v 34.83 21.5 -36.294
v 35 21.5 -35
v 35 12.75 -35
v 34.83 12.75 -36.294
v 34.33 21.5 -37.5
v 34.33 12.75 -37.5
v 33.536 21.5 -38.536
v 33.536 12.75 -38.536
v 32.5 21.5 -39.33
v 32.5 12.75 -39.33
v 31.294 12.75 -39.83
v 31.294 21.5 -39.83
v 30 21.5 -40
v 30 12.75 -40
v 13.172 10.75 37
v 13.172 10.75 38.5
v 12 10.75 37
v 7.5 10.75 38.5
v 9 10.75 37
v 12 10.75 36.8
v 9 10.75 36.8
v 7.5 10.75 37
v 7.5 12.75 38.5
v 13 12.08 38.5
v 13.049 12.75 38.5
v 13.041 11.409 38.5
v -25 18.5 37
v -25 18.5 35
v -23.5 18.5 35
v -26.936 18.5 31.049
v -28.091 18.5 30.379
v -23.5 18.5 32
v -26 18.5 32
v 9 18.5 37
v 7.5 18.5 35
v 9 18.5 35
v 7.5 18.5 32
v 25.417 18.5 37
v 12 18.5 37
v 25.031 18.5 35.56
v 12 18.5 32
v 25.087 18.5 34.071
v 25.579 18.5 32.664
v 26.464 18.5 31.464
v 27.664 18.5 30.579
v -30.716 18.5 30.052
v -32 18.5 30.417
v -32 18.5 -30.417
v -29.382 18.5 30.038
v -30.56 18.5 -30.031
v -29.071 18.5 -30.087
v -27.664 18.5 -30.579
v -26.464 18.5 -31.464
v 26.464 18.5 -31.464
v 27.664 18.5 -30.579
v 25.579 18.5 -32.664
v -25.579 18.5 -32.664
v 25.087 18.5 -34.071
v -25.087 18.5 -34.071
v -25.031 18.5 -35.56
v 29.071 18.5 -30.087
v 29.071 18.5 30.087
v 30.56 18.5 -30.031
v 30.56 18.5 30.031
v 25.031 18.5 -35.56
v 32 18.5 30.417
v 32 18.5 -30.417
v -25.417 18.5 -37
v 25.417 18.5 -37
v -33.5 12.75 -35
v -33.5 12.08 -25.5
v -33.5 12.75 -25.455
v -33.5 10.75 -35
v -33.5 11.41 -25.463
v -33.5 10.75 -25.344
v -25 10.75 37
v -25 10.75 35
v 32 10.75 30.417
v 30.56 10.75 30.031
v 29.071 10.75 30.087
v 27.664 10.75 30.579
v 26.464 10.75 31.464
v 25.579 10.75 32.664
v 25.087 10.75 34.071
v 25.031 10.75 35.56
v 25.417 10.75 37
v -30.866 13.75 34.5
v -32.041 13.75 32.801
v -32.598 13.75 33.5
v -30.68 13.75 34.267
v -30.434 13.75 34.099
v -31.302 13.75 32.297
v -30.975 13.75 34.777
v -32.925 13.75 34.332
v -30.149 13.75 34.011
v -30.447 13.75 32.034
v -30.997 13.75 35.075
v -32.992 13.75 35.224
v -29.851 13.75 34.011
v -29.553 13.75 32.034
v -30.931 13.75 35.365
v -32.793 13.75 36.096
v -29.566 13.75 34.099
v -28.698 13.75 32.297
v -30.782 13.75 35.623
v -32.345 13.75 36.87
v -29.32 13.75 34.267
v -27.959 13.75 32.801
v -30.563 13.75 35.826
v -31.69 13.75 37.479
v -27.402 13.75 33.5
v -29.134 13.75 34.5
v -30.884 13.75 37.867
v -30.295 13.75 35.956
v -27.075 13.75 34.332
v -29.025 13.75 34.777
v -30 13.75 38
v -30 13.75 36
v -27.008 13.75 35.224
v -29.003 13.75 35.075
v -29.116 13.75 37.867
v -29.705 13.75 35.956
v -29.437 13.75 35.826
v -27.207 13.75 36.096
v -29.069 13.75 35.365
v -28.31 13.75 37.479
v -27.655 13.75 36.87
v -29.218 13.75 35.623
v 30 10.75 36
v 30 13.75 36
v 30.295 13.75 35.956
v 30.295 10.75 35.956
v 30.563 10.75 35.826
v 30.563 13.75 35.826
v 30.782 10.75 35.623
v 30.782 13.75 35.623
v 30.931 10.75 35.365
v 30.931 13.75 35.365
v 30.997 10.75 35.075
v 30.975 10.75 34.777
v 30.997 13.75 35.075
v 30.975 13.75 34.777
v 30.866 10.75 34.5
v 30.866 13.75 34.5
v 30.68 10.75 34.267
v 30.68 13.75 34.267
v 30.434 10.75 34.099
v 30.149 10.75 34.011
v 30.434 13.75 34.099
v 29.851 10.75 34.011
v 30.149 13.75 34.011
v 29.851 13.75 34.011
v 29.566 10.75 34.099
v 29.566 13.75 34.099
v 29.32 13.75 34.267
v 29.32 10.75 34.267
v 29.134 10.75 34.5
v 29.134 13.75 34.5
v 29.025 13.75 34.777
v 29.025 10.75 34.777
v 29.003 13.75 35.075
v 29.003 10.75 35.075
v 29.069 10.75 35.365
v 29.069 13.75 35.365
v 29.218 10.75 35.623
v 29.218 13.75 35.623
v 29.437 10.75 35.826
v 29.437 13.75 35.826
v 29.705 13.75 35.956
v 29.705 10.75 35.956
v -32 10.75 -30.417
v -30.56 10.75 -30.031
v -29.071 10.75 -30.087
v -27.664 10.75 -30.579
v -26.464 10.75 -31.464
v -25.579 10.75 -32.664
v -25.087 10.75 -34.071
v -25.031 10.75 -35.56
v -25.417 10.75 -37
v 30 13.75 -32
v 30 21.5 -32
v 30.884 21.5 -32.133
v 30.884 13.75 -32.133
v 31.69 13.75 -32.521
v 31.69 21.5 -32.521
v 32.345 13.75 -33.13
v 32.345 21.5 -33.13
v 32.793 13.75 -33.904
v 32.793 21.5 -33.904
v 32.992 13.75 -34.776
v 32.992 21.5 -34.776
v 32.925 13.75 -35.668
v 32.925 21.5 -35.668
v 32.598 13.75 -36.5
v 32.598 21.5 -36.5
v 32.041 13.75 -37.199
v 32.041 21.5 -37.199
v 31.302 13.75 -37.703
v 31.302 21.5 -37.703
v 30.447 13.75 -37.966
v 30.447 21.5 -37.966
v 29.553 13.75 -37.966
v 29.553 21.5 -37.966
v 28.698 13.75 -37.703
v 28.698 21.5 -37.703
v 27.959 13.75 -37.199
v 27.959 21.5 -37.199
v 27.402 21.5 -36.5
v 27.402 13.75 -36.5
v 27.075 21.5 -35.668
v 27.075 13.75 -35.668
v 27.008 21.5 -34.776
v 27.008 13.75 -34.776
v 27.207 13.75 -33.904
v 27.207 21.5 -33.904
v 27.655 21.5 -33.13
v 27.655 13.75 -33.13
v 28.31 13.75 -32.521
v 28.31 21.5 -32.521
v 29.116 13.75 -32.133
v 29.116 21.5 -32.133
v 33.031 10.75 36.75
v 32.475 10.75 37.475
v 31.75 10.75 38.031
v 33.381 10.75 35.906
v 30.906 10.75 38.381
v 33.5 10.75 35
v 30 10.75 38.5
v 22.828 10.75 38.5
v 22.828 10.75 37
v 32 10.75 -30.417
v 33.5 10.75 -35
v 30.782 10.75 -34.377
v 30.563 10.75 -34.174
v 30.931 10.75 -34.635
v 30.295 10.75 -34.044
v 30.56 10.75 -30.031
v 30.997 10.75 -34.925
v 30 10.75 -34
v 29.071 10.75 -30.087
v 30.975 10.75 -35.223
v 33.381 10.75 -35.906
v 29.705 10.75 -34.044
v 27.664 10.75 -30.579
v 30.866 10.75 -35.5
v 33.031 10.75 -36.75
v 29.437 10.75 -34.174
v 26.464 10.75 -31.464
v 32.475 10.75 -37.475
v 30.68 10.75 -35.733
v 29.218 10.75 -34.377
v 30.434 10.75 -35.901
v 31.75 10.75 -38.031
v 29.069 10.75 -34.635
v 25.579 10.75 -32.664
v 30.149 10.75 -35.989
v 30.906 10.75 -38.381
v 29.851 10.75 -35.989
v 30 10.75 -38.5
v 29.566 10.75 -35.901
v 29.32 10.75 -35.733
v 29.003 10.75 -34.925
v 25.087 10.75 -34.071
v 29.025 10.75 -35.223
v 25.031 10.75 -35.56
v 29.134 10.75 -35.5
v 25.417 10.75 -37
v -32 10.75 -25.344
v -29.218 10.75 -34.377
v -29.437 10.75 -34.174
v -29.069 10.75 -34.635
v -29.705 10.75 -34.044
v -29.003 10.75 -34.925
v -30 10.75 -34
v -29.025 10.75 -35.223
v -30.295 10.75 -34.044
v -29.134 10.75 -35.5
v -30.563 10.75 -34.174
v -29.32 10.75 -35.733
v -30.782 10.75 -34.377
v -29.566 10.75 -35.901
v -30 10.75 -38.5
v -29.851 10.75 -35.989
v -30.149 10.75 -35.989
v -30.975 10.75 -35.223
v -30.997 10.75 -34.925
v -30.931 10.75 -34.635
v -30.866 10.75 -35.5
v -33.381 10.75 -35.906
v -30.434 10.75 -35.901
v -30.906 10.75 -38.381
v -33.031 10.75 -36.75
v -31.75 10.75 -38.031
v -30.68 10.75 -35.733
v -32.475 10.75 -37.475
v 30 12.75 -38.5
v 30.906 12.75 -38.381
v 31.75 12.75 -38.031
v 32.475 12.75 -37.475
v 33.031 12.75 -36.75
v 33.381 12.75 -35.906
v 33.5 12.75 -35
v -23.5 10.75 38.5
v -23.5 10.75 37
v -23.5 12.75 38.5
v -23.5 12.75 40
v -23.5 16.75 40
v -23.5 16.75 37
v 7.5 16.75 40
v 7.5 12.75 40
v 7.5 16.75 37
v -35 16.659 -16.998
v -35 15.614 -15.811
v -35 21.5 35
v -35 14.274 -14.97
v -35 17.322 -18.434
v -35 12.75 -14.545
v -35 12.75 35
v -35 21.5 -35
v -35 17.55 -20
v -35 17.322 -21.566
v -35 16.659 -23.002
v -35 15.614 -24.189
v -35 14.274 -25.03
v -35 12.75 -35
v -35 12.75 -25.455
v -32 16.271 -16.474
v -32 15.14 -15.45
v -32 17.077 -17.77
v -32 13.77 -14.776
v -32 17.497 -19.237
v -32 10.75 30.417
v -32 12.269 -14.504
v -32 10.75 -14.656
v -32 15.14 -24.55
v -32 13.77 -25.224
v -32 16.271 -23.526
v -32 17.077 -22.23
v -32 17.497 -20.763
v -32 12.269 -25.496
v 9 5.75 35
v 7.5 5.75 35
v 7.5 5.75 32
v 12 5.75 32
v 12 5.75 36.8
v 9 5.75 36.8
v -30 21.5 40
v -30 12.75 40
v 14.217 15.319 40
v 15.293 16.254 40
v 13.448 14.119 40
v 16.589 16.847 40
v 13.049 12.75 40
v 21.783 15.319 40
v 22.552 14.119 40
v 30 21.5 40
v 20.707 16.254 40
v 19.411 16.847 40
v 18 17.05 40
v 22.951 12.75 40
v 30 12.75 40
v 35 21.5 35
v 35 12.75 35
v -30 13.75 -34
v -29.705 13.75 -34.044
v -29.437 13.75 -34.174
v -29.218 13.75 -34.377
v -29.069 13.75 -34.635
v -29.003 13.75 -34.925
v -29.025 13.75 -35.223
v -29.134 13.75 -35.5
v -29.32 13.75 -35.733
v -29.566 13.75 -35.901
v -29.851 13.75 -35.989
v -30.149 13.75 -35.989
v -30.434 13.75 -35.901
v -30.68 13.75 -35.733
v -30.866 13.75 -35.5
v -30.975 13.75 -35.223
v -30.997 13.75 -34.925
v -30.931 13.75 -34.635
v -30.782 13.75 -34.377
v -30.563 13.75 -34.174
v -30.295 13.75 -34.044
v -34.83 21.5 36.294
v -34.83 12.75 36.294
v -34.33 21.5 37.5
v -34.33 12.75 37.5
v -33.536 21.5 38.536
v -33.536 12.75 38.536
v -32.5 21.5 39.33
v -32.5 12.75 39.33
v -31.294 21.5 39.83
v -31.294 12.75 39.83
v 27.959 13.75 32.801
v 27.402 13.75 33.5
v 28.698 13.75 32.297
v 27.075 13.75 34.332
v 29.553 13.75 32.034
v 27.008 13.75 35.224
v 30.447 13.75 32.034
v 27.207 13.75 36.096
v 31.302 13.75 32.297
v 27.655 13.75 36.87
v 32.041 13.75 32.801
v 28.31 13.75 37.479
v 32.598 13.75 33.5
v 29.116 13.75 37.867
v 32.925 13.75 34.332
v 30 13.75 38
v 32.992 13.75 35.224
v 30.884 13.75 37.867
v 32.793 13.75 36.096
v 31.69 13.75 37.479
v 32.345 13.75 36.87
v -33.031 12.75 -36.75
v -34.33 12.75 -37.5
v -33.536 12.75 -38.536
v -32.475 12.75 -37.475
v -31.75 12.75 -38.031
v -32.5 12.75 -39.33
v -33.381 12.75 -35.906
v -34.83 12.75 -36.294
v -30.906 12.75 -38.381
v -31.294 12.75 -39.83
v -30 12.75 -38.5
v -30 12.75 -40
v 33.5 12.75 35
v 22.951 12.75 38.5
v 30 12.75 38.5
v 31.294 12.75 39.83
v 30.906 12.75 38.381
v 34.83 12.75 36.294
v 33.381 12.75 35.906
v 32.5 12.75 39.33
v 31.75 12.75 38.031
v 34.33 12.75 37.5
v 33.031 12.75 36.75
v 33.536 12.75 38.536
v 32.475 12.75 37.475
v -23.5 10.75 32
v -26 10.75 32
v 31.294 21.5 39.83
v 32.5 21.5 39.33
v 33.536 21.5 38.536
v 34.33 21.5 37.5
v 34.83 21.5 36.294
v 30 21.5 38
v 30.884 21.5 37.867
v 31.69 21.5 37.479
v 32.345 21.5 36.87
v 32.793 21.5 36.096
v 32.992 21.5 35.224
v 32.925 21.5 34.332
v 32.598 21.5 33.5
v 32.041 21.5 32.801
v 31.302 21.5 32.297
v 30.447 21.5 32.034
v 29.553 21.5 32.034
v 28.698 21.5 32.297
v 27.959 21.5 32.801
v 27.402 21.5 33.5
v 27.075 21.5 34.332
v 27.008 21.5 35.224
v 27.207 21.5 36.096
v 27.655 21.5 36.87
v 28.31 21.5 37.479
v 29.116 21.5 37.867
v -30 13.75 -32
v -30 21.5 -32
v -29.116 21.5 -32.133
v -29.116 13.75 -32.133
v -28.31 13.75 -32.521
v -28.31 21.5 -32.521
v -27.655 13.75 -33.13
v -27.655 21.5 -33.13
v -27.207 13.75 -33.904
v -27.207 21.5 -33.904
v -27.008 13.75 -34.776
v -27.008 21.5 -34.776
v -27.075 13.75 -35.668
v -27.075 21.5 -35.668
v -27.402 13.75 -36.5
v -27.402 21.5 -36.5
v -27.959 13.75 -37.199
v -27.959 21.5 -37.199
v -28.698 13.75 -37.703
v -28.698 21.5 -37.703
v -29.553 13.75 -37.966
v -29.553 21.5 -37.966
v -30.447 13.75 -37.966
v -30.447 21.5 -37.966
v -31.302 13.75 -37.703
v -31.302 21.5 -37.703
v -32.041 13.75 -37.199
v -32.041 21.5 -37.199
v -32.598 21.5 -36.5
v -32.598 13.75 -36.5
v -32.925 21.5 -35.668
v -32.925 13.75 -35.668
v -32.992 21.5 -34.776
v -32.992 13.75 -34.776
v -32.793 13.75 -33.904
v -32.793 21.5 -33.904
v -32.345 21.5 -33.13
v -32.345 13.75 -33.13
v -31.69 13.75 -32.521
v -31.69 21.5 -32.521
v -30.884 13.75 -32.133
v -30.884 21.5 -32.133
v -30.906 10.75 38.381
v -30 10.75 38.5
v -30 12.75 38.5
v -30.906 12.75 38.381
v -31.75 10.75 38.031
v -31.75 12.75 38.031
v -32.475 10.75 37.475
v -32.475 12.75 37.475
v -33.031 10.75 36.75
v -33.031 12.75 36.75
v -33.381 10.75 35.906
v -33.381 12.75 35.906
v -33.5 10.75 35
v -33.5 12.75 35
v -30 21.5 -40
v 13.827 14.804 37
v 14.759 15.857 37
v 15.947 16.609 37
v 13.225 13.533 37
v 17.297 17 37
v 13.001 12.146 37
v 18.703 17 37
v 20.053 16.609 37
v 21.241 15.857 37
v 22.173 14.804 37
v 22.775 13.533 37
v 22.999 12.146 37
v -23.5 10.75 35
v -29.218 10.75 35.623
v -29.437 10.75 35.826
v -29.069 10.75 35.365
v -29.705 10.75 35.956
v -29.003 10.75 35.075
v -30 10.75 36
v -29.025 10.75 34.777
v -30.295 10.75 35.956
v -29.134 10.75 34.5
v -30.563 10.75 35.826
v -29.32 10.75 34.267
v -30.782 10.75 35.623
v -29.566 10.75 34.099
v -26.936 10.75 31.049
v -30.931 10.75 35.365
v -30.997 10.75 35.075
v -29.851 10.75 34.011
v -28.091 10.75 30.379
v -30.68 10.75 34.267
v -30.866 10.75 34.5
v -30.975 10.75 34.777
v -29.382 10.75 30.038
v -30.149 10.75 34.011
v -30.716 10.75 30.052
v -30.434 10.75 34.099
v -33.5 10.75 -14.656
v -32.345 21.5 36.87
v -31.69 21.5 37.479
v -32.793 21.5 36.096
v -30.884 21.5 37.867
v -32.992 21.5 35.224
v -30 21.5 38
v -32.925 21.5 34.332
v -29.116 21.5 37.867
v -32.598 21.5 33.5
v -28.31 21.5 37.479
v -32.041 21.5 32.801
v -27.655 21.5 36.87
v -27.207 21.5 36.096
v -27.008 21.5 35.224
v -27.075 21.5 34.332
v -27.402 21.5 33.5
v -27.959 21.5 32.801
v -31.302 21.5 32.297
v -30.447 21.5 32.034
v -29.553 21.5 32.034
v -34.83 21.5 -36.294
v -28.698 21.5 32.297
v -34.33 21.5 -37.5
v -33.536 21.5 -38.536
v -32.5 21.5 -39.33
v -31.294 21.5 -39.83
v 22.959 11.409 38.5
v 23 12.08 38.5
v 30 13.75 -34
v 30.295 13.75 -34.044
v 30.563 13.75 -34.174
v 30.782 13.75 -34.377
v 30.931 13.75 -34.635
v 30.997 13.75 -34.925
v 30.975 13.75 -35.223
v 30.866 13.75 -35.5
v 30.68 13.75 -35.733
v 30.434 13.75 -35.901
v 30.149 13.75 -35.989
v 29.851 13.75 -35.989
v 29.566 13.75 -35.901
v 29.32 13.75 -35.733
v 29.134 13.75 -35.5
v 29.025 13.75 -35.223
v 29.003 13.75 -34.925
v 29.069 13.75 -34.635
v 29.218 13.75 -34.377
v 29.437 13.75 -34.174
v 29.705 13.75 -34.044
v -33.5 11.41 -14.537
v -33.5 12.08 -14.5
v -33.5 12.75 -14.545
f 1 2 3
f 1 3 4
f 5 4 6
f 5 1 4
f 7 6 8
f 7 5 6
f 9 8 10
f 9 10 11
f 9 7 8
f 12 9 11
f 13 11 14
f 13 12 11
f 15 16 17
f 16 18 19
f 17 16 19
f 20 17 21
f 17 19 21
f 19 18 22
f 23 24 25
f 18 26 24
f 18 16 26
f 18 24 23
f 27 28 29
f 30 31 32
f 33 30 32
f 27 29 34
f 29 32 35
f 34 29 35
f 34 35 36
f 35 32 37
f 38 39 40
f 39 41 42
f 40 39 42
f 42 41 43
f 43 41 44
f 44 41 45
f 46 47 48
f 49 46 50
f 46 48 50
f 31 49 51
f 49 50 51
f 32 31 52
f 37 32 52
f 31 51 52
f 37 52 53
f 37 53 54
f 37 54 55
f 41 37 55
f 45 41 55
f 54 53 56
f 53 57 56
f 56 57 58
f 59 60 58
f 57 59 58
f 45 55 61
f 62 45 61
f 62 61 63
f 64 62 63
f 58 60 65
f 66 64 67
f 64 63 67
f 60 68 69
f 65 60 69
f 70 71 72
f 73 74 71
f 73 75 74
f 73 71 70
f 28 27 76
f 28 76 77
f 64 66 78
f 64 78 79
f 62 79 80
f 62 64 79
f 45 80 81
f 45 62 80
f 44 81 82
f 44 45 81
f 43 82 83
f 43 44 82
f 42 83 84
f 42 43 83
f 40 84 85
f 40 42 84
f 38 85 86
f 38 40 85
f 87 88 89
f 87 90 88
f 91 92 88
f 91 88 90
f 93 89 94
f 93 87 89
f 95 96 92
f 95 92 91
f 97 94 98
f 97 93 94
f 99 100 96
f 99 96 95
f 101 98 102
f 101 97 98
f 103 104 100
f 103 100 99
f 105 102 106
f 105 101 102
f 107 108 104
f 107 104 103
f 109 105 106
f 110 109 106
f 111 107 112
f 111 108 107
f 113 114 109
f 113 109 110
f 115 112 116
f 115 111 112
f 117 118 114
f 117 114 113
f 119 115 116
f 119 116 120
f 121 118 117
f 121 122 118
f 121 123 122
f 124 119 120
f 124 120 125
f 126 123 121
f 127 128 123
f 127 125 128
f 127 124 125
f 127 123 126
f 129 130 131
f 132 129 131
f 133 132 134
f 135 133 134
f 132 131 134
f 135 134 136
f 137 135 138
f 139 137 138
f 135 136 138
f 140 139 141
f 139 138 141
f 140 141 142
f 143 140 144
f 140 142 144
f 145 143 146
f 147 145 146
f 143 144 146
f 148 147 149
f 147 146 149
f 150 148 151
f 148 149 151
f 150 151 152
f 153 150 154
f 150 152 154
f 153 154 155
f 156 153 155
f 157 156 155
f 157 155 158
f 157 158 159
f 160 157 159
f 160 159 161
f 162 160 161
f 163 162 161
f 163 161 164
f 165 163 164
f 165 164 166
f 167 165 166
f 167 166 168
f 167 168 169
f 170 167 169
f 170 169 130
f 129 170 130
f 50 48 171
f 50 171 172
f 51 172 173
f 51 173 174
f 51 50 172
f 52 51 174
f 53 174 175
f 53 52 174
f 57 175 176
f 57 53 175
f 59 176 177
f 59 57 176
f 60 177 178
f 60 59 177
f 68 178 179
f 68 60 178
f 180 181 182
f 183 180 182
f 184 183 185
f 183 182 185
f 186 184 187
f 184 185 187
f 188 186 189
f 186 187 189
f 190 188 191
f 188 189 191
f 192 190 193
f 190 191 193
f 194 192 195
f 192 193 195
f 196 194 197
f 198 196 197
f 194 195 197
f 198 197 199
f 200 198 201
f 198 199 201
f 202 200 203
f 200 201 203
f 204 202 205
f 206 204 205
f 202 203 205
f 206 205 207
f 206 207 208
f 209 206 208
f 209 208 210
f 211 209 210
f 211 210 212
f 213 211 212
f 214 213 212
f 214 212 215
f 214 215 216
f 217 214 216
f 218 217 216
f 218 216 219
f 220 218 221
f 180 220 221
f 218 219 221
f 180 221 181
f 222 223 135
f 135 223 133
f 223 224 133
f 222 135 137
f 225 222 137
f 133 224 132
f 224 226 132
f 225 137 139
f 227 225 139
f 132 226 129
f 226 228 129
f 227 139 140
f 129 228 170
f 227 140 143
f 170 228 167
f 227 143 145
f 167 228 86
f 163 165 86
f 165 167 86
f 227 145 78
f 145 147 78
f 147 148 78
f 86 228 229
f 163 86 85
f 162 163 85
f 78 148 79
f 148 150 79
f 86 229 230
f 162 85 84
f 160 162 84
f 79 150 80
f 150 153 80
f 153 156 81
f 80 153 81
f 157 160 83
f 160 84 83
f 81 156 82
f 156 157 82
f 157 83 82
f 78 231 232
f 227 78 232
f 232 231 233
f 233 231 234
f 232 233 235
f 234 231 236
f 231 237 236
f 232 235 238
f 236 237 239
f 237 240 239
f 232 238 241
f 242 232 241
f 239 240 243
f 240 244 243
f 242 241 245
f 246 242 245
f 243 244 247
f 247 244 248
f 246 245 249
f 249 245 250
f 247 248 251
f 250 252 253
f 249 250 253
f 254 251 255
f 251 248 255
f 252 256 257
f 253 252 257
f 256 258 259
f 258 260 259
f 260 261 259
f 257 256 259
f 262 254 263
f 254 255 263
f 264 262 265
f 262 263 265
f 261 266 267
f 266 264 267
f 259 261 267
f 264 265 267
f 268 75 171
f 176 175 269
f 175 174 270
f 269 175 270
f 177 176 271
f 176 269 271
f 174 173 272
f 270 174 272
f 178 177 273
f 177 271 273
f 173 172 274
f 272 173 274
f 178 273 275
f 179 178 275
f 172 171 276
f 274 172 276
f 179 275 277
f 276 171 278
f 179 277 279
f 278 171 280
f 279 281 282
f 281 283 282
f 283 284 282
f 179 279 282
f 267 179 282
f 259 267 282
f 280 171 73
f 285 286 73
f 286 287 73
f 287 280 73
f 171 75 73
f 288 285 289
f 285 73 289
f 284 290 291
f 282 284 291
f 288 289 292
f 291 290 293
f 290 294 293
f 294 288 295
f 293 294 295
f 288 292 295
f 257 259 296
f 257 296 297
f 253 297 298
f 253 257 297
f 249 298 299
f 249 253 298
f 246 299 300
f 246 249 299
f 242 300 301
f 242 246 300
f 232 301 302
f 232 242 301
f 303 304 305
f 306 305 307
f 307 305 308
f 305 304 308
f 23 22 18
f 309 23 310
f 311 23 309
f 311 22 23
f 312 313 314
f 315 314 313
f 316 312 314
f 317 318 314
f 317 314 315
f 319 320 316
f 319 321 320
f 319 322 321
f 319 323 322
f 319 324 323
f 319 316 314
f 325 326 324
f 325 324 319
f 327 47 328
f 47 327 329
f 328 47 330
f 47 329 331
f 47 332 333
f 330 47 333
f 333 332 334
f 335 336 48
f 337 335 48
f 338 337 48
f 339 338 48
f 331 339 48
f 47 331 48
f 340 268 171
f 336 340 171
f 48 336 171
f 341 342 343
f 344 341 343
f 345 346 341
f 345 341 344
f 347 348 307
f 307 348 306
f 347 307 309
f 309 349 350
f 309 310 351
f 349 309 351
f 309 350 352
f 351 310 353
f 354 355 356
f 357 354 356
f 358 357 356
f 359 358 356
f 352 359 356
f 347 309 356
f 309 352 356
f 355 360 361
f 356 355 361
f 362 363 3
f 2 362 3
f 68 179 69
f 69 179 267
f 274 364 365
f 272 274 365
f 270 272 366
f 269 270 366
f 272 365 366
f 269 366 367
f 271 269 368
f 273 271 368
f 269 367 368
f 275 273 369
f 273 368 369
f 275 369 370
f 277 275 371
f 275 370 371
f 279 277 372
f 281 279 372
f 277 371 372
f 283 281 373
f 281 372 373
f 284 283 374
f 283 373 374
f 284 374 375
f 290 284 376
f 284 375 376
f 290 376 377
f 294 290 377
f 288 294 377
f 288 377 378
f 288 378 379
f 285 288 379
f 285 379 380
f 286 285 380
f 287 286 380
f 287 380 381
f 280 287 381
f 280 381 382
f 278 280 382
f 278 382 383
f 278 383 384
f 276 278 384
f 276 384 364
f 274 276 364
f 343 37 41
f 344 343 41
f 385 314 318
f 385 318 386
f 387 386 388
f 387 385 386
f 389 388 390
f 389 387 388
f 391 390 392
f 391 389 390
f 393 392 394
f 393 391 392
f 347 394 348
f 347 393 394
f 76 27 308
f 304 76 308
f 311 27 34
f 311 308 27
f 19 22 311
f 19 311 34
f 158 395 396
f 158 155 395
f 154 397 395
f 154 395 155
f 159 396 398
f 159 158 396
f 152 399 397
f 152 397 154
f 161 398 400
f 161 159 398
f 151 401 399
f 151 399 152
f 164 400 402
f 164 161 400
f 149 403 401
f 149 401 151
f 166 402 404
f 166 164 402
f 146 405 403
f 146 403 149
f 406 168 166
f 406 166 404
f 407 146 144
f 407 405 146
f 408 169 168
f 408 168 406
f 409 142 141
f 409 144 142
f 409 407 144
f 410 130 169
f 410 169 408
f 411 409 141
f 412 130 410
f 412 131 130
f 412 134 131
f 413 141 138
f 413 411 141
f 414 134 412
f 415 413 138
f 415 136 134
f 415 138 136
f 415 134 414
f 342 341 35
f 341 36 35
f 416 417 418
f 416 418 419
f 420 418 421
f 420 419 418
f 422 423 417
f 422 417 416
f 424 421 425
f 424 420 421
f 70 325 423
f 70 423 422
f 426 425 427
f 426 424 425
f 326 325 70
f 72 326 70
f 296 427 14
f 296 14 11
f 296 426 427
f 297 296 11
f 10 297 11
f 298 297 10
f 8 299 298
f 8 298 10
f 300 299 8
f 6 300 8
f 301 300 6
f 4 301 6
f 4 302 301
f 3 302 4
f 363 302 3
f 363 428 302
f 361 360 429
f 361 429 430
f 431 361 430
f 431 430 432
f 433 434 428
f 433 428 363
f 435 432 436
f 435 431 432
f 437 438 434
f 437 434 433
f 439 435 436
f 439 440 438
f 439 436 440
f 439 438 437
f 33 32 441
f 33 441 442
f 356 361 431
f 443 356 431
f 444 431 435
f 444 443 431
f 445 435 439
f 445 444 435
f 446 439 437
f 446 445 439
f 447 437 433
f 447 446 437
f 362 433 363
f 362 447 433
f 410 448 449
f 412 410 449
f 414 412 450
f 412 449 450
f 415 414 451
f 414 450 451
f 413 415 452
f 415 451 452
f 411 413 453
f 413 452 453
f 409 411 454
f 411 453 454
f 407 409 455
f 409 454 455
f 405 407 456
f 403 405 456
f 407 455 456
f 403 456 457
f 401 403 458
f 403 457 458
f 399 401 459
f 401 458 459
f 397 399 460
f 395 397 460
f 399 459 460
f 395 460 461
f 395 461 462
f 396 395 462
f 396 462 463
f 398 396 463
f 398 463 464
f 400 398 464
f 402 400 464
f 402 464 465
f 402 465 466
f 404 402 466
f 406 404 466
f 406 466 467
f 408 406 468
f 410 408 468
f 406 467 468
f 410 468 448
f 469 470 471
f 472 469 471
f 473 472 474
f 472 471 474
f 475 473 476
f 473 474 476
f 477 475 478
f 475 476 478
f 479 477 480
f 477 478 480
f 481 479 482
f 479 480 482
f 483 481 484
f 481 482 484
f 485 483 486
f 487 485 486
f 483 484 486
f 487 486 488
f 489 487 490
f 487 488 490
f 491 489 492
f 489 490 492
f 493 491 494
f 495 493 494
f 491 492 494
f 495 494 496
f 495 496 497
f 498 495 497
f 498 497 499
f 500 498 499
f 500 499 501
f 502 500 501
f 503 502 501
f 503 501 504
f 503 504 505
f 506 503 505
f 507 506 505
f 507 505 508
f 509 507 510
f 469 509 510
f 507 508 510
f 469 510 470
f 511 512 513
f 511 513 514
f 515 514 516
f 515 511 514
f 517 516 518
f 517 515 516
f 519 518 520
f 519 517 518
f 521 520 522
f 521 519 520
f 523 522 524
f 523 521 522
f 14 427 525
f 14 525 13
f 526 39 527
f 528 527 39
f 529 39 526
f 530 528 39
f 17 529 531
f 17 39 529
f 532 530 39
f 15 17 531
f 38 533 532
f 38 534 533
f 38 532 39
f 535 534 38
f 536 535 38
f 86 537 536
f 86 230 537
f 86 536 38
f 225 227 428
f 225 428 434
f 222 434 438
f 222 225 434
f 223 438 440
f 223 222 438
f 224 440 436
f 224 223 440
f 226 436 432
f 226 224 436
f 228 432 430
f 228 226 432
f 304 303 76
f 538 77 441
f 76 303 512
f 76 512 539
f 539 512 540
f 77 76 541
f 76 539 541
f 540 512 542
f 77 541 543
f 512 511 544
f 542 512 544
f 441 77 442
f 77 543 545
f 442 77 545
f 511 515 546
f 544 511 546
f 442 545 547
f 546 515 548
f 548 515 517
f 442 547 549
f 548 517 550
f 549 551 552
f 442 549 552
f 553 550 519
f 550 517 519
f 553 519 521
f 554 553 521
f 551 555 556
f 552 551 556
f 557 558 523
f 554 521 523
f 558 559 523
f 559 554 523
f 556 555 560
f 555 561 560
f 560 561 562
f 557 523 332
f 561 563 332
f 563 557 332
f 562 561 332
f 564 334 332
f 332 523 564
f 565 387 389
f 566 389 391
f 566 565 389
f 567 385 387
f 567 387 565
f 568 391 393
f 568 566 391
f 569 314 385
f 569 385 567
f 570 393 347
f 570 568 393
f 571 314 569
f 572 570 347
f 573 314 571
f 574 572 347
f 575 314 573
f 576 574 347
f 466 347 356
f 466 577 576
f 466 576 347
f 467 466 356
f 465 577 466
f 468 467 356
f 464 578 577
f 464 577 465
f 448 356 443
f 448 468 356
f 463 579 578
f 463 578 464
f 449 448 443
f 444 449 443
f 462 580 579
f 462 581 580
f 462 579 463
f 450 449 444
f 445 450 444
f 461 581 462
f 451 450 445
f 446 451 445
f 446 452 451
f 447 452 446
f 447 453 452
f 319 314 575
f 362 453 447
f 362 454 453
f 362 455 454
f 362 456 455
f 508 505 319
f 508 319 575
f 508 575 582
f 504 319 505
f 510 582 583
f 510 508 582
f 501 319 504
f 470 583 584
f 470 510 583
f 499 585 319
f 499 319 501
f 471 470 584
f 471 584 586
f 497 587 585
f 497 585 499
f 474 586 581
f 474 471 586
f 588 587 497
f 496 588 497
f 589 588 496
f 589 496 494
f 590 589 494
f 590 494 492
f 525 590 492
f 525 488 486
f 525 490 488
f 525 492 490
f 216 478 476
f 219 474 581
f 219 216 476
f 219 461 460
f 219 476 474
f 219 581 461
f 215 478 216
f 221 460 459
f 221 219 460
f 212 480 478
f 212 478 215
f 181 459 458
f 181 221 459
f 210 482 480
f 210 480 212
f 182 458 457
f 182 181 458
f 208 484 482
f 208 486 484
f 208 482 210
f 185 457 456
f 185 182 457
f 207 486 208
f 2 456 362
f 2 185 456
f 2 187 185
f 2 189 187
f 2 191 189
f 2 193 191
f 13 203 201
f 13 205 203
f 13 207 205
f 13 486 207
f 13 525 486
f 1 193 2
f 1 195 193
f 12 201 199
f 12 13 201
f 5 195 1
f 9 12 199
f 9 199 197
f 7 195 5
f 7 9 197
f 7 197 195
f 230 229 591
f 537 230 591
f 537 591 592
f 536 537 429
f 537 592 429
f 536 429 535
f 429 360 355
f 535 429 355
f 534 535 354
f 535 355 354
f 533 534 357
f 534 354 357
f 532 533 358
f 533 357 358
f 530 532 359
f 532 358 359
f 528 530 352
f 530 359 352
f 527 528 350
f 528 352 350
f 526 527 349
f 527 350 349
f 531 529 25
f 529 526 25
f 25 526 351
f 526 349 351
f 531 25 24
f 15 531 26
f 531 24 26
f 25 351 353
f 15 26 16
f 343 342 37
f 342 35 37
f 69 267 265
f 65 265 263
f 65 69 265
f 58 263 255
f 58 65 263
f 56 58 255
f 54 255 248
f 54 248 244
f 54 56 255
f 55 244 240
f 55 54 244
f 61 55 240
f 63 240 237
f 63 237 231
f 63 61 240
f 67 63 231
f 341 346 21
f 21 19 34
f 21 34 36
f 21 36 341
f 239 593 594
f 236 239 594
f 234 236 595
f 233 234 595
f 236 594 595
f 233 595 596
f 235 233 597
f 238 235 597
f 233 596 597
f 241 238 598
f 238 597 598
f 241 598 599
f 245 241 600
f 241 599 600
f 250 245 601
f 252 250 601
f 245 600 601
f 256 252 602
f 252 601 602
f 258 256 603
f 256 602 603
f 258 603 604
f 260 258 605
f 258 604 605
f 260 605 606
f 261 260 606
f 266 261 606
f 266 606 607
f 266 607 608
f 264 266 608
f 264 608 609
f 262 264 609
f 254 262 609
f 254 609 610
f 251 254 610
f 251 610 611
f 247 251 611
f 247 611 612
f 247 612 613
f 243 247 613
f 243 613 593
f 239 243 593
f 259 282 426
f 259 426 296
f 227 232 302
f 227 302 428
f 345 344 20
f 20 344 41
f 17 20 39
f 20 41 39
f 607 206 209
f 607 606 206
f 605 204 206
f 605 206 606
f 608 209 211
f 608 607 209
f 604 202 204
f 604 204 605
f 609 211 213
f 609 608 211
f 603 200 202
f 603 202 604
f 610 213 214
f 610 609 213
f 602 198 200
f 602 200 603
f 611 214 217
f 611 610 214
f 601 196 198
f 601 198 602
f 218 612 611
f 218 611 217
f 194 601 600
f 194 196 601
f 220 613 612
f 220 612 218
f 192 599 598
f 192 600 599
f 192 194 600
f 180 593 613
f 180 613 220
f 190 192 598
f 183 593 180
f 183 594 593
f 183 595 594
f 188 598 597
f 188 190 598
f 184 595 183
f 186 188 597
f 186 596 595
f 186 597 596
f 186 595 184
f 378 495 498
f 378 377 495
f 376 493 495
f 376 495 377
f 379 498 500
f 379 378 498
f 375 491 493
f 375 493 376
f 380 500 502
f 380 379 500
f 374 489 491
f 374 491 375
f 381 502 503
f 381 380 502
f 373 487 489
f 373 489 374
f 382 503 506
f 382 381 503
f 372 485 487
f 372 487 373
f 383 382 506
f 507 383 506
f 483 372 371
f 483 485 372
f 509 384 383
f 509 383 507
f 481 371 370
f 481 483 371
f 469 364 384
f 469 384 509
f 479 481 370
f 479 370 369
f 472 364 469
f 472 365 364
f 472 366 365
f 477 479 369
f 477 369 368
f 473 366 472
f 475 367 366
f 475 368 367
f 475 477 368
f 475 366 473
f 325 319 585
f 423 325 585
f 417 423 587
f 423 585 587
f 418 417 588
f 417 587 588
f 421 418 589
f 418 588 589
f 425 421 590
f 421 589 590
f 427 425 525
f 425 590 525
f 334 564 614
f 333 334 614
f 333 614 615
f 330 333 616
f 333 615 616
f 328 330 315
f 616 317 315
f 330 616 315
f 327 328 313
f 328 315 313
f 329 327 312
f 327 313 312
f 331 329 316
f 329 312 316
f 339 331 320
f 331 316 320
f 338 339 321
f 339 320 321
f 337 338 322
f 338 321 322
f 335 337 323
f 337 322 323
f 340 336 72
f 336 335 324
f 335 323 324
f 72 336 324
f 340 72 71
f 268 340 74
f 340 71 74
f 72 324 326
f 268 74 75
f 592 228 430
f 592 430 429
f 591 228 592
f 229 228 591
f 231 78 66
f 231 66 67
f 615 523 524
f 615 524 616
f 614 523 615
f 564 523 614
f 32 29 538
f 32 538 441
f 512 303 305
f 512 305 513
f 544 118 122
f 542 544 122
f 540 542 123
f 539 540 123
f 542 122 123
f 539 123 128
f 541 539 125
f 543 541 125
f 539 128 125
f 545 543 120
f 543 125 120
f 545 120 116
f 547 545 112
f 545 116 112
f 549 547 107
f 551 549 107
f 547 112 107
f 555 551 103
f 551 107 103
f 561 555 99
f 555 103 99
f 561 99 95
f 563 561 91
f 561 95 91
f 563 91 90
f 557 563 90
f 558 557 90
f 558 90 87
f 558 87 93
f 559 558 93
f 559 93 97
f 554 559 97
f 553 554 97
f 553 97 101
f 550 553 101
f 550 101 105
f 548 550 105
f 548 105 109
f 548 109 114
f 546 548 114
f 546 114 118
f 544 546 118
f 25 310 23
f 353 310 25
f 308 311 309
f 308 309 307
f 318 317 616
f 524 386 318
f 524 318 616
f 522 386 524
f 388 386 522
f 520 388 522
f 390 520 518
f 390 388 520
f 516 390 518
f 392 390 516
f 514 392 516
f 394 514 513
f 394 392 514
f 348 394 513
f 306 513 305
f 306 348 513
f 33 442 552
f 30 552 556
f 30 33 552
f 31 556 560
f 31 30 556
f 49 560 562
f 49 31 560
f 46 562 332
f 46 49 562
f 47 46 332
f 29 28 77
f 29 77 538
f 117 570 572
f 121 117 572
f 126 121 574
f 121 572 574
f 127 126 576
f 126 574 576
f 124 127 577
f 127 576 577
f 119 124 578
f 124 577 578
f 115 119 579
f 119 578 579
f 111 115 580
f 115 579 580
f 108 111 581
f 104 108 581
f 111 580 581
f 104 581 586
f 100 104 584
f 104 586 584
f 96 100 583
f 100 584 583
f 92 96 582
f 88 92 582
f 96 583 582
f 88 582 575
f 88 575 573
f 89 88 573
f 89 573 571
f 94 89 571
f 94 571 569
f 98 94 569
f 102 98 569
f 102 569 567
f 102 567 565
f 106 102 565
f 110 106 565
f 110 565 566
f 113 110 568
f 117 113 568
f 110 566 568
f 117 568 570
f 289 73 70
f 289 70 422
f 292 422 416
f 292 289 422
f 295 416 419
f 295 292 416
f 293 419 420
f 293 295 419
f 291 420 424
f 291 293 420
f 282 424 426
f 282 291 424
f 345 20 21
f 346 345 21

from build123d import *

# Parameters (mm, degrees)
SKETCH1_W              = 70
SKETCH1_H              = 80
BOSS_EXTRUDE1_DEPTH    = 21.5
FILLET1_R              = 5
SHELL1_T               = 3
BOSS_EXTRUDE2_REACH    = 59.335
SKETCH3_R              = 5
SPLIT2_SURFACE_1_BACK  = 109.454
SPLIT2_SURFACE_1_DEPTH = 218.908
SPLIT2_SURFACE_2_BACK  = 109.454
SPLIT2_SURFACE_2_DEPTH = 218.908
SKETCH4_R              = 1
CUT_EXTRUDE1_DEPTH     = 58.334544561
SKETCH6_OUTSIDE_W      = 93.69
SKETCH6_OUTSIDE_H      = 103.69
CUT_EXTRUDE3_DEPTH     = 2
BOSS_EXTRUDE3_START    = 1.8
BOSS_EXTRUDE3_DEPTH    = 1.8
SKETCH8_R              = 5.5
CUT_EXTRUDE4_DEPTH     = 10
SKETCH9_R              = 5
SKETCH9_W              = 20
SKETCH9_H              = 12
CUT_EXTRUDE5_DEPTH     = 10
BOSS_EXTRUDE4_DEPTH    = 7.75
SKETCH5_R              = 3
CUT_EXTRUDE2_DEPTH     = 7.75
SKETCH12_W             = 31
SKETCH12_H             = 12
CUT_EXTRUDE6_DEPTH     = 10
BOSS_EXTRUDE5_DEPTH    = 5


with BuildPart() as part:
    # Sketch1 → Boss-Extrude1 (new body)
    with BuildSketch(Plane(origin=(0, 0, 0), x_dir=(1, 0, 0), z_dir=(0, 1, 0))):
        Rectangle(SKETCH1_W, SKETCH1_H)
    extrude(amount=BOSS_EXTRUDE1_DEPTH)

    # Fillet1
    fillet1_edges = [part.edges().sort_by_distance(p)[0] for p in [
        (-35, 10.75, -40),
        (35, 10.75, -40),
        (35, 10.75, 40),
        (-35, 10.75, 40),
    ]]
    fillet(fillet1_edges, radius=FILLET1_R)

    # Shell1 (no face opened: a closed hollow body)
    add(offset(amount=-SHELL1_T, mode=Mode.PRIVATE), mode=Mode.SUBTRACT)

    # Sketch3 → Boss-Extrude2 (add, up to next)
    with BuildSketch(Plane(origin=(0, 21.5, 0), x_dir=(1, 0, 0), z_dir=(0, 1, 0)), mode=Mode.PRIVATE) as boss_extrude2_sk1:
        with Locations((-30, 35)):
            Circle(SKETCH3_R)
    boss_extrude2_tool1 = extrude(boss_extrude2_sk1.sketch, amount=-BOSS_EXTRUDE2_REACH, mode=Mode.PRIVATE) - part.part
    # Sketch3 → Boss-Extrude2 (add, up to next)
    with BuildSketch(Plane(origin=(0, 21.5, 0), x_dir=(1, 0, 0), z_dir=(0, 1, 0)), mode=Mode.PRIVATE) as boss_extrude2_sk2:
        with Locations((30, 35)):
            Circle(SKETCH3_R)
    boss_extrude2_tool2 = extrude(boss_extrude2_sk2.sketch, amount=-BOSS_EXTRUDE2_REACH, mode=Mode.PRIVATE) - part.part
    # Sketch3 → Boss-Extrude2 (add, up to next)
    with BuildSketch(Plane(origin=(0, 21.5, 0), x_dir=(1, 0, 0), z_dir=(0, 1, 0)), mode=Mode.PRIVATE) as boss_extrude2_sk3:
        with Locations((30, -35)):
            Circle(SKETCH3_R)
    boss_extrude2_tool3 = extrude(boss_extrude2_sk3.sketch, amount=-BOSS_EXTRUDE2_REACH, mode=Mode.PRIVATE) - part.part
    # Sketch3 → Boss-Extrude2 (add, up to next)
    with BuildSketch(Plane(origin=(0, 21.5, 0), x_dir=(1, 0, 0), z_dir=(0, 1, 0)), mode=Mode.PRIVATE) as boss_extrude2_sk4:
        with Locations((-30, -35)):
            Circle(SKETCH3_R)
    boss_extrude2_tool4 = extrude(boss_extrude2_sk4.sketch, amount=-BOSS_EXTRUDE2_REACH, mode=Mode.PRIVATE) - part.part
    add(boss_extrude2_tool1.solids().sort_by_distance((-30, 21.5, -35))[0])
    add(boss_extrude2_tool2.solids().sort_by_distance((30, 21.5, -35))[0])
    add(boss_extrude2_tool3.solids().sort_by_distance((30, 21.5, 35))[0])
    add(boss_extrude2_tool4.solids().sort_by_distance((-30, 21.5, 35))[0])


with BuildPart() as body_2:
    # Split2: the piece behind the surface
    add(part.part)
    # Split2 surface: a surface, the sketch's curves swept straight by 218.908 mm
    with BuildLine(Plane(origin=(0, 0, 0), x_dir=(0, 0, -1), z_dir=(1, 0, 0)).offset(-SPLIT2_SURFACE_1_BACK), mode=Mode.PRIVATE) as split2_surface_1_path:
        Line((-40, 10.75), (51.562362236, 10.75))
    split2_surface_1 = Shell.extrude(split2_surface_1_path.wire(), (1 * SPLIT2_SURFACE_1_DEPTH, 0 * SPLIT2_SURFACE_1_DEPTH, 0 * SPLIT2_SURFACE_1_DEPTH))
    split(bisect_by=split2_surface_1, keep=Keep.BOTTOM)


with BuildPart() as part_1:
    add(part.part)

    # Split2: split by a surface, the side it looks to stays
    # Split2 surface: a surface, the sketch's curves swept straight by 218.908 mm
    with BuildLine(Plane(origin=(0, 0, 0), x_dir=(0, 0, -1), z_dir=(1, 0, 0)).offset(-SPLIT2_SURFACE_2_BACK), mode=Mode.PRIVATE) as split2_surface_2_path:
        Line((-40, 10.75), (51.562362236, 10.75))
    split2_surface_2 = Shell.extrude(split2_surface_2_path.wire(), (1 * SPLIT2_SURFACE_2_DEPTH, 0 * SPLIT2_SURFACE_2_DEPTH, 0 * SPLIT2_SURFACE_2_DEPTH))
    split(bisect_by=split2_surface_2, keep=Keep.TOP)


with BuildPart() as cut_extrude1_tool:
    # Sketch4 → Cut-Extrude1 (new, through all)
    with BuildSketch(Plane(origin=(0, 21.5, 0), x_dir=(1, 0, 0), z_dir=(0, 1, 0))):
        with Locations(Location((-30, 35, 0), (0, 0, 270))):
            Circle(SKETCH4_R)
        with Locations(Location((30, 35, 0), (0, 0, 270))):
            Circle(SKETCH4_R)
        with Locations(Location((30, -35, 0), (0, 0, 270))):
            Circle(SKETCH4_R)
        with Locations(Location((-30, -35, 0), (0, 0, 270))):
            Circle(SKETCH4_R)
    extrude(amount=-CUT_EXTRUDE1_DEPTH)


with BuildPart() as part_2:
    add(part_1.part)

    # Cut-Extrude1: cut by cut_extrude1_tool
    add(cut_extrude1_tool.part, mode=Mode.SUBTRACT)

    # Sketch6 outside → Cut-Extrude3 (cut)
    with BuildSketch(Plane.XZ.offset(-10.75)):
        Rectangle(SKETCH6_OUTSIDE_W, SKETCH6_OUTSIDE_H)
        with BuildLine():
            Line((-30, -38.5), (30, -38.5))
            ThreePointArc((30, -38.5), (32.474873734, -37.474873734), (33.5, -35))
            Line((33.5, -35), (33.5, 35))
            ThreePointArc((33.5, 35), (32.474873734, 37.474873734), (30, 38.5))
            Line((30, 38.5), (-30, 38.5))
            ThreePointArc((-30, 38.5), (-32.474873734, 37.474873734), (-33.5, 35))
            Line((-33.5, 35), (-33.5, -35))
            ThreePointArc((-33.5, -35), (-32.474873734, -37.474873734), (-30, -38.5))
        make_face(mode=Mode.SUBTRACT)
    extrude(amount=-CUT_EXTRUDE3_DEPTH, mode=Mode.SUBTRACT)


with BuildPart() as body_2_1:
    add(body_2.part)

    # Cut-Extrude1: cut by cut_extrude1_tool
    add(cut_extrude1_tool.part, mode=Mode.SUBTRACT)

    # Sketch7 → Boss-Extrude3 (add)
    with BuildSketch(Plane(origin=(0, 10.75, 0), x_dir=(1, 0, 0), z_dir=(0, 1, 0)).offset(BOSS_EXTRUDE3_START)):
        with BuildLine():
            Line((-30, 40), (30, 40))
            ThreePointArc((30, 40), (33.535533906, 38.535533906), (35, 35))
            Line((35, 35), (35, -35))
            ThreePointArc((35, -35), (33.535533906, -38.535533906), (30, -40))
            Line((30, -40), (-30, -40))
            ThreePointArc((-30, -40), (-33.535533906, -38.535533906), (-35, -35))
            Line((-35, -35), (-35, 35))
            ThreePointArc((-35, 35), (-33.535533906, 38.535533906), (-30, 40))
        make_face()
        with BuildLine():
            Line((30, 38.7), (-30, 38.7))
            ThreePointArc((-30, 38.7), (-32.61629509, 37.61629509), (-33.7, 35))
            Line((-33.7, 35), (-33.7, -35))
            ThreePointArc((-33.7, -35), (-32.61629509, -37.61629509), (-30, -38.7))
            Line((-30, -38.7), (30, -38.7))
            ThreePointArc((30, -38.7), (32.61629509, -37.61629509), (33.7, -35))
            Line((33.7, -35), (33.7, 35))
            ThreePointArc((33.7, 35), (32.61629509, 37.61629509), (30, 38.7))
        make_face(mode=Mode.SUBTRACT)
    extrude(amount=-BOSS_EXTRUDE3_DEPTH)


with BuildPart() as cut_extrude4_tool:
    # Sketch8 → Cut-Extrude4 (new body)
    with BuildSketch(Plane.ZY.offset(35)):
        with Locations((-20, 12.05)):
            Circle(SKETCH8_R)
    extrude(amount=-CUT_EXTRUDE4_DEPTH)


with BuildPart() as part_3:
    add(part_2.part)

    # Cut-Extrude4: cut by cut_extrude4_tool
    add(cut_extrude4_tool.part, mode=Mode.SUBTRACT)


with BuildPart() as body_2_2:
    add(body_2_1.part)

    # Cut-Extrude4: cut by cut_extrude4_tool
    add(cut_extrude4_tool.part, mode=Mode.SUBTRACT)


with BuildPart() as cut_extrude5_tool:
    # Sketch9 → Cut-Extrude5 (new body)
    with BuildSketch(Plane.XY.offset(40)):
        with Locations((18, 12.05)):
            Circle(SKETCH9_R)
        with Locations((-10, 10.75)):
            Rectangle(SKETCH9_W, SKETCH9_H)
    extrude(amount=-CUT_EXTRUDE5_DEPTH)


with BuildPart() as part_4:
    add(part_3.part)

    # Cut-Extrude5: cut by cut_extrude5_tool
    add(cut_extrude5_tool.part, mode=Mode.SUBTRACT)

    # Sketch11 → Boss-Extrude4 (add)
    with BuildSketch(Plane.XZ.offset(-18.5)):
        Polygon((-28, 38.5), (12, 38.5), (12, 32), (7.5, 32), (7.5, 35), (9, 35), (9, 37), (-25, 37), (-25, 35), (-23.5, 35), (-23.5, 32), (-28, 32), align=None)
    extrude(amount=BOSS_EXTRUDE4_DEPTH)

    # Sketch5 → Cut-Extrude2 (cut)
    with BuildSketch(Plane(origin=(0, 21.5, 0), x_dir=(1, 0, 0), z_dir=(0, 1, 0))):
        with Locations(Location((-30, 35, 0), (0, 0, 270))):
            Circle(SKETCH5_R)
        with Locations(Location((30, 35, 0), (0, 0, 270))):
            Circle(SKETCH5_R)
        with Locations(Location((30, -35, 0), (0, 0, 270))):
            Circle(SKETCH5_R)
        with Locations(Location((-30, -35, 0), (0, 0, 270))):
            Circle(SKETCH5_R)
    extrude(amount=-CUT_EXTRUDE2_DEPTH, mode=Mode.SUBTRACT)


with BuildPart() as body_2_3:
    add(body_2_2.part)

    # Cut-Extrude5: cut by cut_extrude5_tool
    add(cut_extrude5_tool.part, mode=Mode.SUBTRACT)


with BuildPart() as cut_extrude6_tool:
    # Sketch12 → Cut-Extrude6 (new body)
    with BuildSketch(Plane(origin=(0, 0, 37), x_dir=(-1, 0, 0), z_dir=(0, 0, -1))):
        with Locations((8, 10.75)):
            Rectangle(SKETCH12_W, SKETCH12_H)
    extrude(amount=-CUT_EXTRUDE6_DEPTH)


with BuildPart() as part_5:
    add(part_4.part)

    # Cut-Extrude6: cut by cut_extrude6_tool
    add(cut_extrude6_tool.part, mode=Mode.SUBTRACT)

    # Sketch14 → Boss-Extrude5 (add)
    with BuildSketch(Plane.XZ.offset(-10.75)):
        Polygon((12, 36.8), (9, 36.8), (9, 35), (7.5, 35), (7.5, 32), (12, 32), align=None)
    extrude(amount=BOSS_EXTRUDE5_DEPTH)


with BuildPart() as body_2_4:
    add(body_2_3.part)

    # Cut-Extrude6: cut by cut_extrude6_tool
    add(cut_extrude6_tool.part, mode=Mode.SUBTRACT)


solid = part_5.part
